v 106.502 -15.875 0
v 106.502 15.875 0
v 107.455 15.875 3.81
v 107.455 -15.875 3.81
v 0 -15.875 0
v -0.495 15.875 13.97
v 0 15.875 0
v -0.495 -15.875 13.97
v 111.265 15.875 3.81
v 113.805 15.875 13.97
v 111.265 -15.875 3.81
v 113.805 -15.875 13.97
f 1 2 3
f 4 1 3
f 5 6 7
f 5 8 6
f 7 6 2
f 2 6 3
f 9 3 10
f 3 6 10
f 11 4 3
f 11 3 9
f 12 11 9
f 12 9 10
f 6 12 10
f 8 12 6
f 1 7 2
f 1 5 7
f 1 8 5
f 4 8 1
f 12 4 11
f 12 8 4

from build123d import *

# Parameters (mm, degrees)
F1_DEPTH = 15.875


with BuildPart() as f1:
    # F0 (on Front) → F1 (new body, symmetric)
    with BuildSketch(Plane.XZ):
        Polygon((107.454668, 3.81), (0, 0), (106.502168, 0), align=None)
        Polygon((-0.495332, 13.97), (0, 0), (107.454668, 3.81), (111.264668, 3.81), (113.804668, 13.97), align=None)
    extrude(amount=F1_DEPTH, both=True)


solid = f1.part
